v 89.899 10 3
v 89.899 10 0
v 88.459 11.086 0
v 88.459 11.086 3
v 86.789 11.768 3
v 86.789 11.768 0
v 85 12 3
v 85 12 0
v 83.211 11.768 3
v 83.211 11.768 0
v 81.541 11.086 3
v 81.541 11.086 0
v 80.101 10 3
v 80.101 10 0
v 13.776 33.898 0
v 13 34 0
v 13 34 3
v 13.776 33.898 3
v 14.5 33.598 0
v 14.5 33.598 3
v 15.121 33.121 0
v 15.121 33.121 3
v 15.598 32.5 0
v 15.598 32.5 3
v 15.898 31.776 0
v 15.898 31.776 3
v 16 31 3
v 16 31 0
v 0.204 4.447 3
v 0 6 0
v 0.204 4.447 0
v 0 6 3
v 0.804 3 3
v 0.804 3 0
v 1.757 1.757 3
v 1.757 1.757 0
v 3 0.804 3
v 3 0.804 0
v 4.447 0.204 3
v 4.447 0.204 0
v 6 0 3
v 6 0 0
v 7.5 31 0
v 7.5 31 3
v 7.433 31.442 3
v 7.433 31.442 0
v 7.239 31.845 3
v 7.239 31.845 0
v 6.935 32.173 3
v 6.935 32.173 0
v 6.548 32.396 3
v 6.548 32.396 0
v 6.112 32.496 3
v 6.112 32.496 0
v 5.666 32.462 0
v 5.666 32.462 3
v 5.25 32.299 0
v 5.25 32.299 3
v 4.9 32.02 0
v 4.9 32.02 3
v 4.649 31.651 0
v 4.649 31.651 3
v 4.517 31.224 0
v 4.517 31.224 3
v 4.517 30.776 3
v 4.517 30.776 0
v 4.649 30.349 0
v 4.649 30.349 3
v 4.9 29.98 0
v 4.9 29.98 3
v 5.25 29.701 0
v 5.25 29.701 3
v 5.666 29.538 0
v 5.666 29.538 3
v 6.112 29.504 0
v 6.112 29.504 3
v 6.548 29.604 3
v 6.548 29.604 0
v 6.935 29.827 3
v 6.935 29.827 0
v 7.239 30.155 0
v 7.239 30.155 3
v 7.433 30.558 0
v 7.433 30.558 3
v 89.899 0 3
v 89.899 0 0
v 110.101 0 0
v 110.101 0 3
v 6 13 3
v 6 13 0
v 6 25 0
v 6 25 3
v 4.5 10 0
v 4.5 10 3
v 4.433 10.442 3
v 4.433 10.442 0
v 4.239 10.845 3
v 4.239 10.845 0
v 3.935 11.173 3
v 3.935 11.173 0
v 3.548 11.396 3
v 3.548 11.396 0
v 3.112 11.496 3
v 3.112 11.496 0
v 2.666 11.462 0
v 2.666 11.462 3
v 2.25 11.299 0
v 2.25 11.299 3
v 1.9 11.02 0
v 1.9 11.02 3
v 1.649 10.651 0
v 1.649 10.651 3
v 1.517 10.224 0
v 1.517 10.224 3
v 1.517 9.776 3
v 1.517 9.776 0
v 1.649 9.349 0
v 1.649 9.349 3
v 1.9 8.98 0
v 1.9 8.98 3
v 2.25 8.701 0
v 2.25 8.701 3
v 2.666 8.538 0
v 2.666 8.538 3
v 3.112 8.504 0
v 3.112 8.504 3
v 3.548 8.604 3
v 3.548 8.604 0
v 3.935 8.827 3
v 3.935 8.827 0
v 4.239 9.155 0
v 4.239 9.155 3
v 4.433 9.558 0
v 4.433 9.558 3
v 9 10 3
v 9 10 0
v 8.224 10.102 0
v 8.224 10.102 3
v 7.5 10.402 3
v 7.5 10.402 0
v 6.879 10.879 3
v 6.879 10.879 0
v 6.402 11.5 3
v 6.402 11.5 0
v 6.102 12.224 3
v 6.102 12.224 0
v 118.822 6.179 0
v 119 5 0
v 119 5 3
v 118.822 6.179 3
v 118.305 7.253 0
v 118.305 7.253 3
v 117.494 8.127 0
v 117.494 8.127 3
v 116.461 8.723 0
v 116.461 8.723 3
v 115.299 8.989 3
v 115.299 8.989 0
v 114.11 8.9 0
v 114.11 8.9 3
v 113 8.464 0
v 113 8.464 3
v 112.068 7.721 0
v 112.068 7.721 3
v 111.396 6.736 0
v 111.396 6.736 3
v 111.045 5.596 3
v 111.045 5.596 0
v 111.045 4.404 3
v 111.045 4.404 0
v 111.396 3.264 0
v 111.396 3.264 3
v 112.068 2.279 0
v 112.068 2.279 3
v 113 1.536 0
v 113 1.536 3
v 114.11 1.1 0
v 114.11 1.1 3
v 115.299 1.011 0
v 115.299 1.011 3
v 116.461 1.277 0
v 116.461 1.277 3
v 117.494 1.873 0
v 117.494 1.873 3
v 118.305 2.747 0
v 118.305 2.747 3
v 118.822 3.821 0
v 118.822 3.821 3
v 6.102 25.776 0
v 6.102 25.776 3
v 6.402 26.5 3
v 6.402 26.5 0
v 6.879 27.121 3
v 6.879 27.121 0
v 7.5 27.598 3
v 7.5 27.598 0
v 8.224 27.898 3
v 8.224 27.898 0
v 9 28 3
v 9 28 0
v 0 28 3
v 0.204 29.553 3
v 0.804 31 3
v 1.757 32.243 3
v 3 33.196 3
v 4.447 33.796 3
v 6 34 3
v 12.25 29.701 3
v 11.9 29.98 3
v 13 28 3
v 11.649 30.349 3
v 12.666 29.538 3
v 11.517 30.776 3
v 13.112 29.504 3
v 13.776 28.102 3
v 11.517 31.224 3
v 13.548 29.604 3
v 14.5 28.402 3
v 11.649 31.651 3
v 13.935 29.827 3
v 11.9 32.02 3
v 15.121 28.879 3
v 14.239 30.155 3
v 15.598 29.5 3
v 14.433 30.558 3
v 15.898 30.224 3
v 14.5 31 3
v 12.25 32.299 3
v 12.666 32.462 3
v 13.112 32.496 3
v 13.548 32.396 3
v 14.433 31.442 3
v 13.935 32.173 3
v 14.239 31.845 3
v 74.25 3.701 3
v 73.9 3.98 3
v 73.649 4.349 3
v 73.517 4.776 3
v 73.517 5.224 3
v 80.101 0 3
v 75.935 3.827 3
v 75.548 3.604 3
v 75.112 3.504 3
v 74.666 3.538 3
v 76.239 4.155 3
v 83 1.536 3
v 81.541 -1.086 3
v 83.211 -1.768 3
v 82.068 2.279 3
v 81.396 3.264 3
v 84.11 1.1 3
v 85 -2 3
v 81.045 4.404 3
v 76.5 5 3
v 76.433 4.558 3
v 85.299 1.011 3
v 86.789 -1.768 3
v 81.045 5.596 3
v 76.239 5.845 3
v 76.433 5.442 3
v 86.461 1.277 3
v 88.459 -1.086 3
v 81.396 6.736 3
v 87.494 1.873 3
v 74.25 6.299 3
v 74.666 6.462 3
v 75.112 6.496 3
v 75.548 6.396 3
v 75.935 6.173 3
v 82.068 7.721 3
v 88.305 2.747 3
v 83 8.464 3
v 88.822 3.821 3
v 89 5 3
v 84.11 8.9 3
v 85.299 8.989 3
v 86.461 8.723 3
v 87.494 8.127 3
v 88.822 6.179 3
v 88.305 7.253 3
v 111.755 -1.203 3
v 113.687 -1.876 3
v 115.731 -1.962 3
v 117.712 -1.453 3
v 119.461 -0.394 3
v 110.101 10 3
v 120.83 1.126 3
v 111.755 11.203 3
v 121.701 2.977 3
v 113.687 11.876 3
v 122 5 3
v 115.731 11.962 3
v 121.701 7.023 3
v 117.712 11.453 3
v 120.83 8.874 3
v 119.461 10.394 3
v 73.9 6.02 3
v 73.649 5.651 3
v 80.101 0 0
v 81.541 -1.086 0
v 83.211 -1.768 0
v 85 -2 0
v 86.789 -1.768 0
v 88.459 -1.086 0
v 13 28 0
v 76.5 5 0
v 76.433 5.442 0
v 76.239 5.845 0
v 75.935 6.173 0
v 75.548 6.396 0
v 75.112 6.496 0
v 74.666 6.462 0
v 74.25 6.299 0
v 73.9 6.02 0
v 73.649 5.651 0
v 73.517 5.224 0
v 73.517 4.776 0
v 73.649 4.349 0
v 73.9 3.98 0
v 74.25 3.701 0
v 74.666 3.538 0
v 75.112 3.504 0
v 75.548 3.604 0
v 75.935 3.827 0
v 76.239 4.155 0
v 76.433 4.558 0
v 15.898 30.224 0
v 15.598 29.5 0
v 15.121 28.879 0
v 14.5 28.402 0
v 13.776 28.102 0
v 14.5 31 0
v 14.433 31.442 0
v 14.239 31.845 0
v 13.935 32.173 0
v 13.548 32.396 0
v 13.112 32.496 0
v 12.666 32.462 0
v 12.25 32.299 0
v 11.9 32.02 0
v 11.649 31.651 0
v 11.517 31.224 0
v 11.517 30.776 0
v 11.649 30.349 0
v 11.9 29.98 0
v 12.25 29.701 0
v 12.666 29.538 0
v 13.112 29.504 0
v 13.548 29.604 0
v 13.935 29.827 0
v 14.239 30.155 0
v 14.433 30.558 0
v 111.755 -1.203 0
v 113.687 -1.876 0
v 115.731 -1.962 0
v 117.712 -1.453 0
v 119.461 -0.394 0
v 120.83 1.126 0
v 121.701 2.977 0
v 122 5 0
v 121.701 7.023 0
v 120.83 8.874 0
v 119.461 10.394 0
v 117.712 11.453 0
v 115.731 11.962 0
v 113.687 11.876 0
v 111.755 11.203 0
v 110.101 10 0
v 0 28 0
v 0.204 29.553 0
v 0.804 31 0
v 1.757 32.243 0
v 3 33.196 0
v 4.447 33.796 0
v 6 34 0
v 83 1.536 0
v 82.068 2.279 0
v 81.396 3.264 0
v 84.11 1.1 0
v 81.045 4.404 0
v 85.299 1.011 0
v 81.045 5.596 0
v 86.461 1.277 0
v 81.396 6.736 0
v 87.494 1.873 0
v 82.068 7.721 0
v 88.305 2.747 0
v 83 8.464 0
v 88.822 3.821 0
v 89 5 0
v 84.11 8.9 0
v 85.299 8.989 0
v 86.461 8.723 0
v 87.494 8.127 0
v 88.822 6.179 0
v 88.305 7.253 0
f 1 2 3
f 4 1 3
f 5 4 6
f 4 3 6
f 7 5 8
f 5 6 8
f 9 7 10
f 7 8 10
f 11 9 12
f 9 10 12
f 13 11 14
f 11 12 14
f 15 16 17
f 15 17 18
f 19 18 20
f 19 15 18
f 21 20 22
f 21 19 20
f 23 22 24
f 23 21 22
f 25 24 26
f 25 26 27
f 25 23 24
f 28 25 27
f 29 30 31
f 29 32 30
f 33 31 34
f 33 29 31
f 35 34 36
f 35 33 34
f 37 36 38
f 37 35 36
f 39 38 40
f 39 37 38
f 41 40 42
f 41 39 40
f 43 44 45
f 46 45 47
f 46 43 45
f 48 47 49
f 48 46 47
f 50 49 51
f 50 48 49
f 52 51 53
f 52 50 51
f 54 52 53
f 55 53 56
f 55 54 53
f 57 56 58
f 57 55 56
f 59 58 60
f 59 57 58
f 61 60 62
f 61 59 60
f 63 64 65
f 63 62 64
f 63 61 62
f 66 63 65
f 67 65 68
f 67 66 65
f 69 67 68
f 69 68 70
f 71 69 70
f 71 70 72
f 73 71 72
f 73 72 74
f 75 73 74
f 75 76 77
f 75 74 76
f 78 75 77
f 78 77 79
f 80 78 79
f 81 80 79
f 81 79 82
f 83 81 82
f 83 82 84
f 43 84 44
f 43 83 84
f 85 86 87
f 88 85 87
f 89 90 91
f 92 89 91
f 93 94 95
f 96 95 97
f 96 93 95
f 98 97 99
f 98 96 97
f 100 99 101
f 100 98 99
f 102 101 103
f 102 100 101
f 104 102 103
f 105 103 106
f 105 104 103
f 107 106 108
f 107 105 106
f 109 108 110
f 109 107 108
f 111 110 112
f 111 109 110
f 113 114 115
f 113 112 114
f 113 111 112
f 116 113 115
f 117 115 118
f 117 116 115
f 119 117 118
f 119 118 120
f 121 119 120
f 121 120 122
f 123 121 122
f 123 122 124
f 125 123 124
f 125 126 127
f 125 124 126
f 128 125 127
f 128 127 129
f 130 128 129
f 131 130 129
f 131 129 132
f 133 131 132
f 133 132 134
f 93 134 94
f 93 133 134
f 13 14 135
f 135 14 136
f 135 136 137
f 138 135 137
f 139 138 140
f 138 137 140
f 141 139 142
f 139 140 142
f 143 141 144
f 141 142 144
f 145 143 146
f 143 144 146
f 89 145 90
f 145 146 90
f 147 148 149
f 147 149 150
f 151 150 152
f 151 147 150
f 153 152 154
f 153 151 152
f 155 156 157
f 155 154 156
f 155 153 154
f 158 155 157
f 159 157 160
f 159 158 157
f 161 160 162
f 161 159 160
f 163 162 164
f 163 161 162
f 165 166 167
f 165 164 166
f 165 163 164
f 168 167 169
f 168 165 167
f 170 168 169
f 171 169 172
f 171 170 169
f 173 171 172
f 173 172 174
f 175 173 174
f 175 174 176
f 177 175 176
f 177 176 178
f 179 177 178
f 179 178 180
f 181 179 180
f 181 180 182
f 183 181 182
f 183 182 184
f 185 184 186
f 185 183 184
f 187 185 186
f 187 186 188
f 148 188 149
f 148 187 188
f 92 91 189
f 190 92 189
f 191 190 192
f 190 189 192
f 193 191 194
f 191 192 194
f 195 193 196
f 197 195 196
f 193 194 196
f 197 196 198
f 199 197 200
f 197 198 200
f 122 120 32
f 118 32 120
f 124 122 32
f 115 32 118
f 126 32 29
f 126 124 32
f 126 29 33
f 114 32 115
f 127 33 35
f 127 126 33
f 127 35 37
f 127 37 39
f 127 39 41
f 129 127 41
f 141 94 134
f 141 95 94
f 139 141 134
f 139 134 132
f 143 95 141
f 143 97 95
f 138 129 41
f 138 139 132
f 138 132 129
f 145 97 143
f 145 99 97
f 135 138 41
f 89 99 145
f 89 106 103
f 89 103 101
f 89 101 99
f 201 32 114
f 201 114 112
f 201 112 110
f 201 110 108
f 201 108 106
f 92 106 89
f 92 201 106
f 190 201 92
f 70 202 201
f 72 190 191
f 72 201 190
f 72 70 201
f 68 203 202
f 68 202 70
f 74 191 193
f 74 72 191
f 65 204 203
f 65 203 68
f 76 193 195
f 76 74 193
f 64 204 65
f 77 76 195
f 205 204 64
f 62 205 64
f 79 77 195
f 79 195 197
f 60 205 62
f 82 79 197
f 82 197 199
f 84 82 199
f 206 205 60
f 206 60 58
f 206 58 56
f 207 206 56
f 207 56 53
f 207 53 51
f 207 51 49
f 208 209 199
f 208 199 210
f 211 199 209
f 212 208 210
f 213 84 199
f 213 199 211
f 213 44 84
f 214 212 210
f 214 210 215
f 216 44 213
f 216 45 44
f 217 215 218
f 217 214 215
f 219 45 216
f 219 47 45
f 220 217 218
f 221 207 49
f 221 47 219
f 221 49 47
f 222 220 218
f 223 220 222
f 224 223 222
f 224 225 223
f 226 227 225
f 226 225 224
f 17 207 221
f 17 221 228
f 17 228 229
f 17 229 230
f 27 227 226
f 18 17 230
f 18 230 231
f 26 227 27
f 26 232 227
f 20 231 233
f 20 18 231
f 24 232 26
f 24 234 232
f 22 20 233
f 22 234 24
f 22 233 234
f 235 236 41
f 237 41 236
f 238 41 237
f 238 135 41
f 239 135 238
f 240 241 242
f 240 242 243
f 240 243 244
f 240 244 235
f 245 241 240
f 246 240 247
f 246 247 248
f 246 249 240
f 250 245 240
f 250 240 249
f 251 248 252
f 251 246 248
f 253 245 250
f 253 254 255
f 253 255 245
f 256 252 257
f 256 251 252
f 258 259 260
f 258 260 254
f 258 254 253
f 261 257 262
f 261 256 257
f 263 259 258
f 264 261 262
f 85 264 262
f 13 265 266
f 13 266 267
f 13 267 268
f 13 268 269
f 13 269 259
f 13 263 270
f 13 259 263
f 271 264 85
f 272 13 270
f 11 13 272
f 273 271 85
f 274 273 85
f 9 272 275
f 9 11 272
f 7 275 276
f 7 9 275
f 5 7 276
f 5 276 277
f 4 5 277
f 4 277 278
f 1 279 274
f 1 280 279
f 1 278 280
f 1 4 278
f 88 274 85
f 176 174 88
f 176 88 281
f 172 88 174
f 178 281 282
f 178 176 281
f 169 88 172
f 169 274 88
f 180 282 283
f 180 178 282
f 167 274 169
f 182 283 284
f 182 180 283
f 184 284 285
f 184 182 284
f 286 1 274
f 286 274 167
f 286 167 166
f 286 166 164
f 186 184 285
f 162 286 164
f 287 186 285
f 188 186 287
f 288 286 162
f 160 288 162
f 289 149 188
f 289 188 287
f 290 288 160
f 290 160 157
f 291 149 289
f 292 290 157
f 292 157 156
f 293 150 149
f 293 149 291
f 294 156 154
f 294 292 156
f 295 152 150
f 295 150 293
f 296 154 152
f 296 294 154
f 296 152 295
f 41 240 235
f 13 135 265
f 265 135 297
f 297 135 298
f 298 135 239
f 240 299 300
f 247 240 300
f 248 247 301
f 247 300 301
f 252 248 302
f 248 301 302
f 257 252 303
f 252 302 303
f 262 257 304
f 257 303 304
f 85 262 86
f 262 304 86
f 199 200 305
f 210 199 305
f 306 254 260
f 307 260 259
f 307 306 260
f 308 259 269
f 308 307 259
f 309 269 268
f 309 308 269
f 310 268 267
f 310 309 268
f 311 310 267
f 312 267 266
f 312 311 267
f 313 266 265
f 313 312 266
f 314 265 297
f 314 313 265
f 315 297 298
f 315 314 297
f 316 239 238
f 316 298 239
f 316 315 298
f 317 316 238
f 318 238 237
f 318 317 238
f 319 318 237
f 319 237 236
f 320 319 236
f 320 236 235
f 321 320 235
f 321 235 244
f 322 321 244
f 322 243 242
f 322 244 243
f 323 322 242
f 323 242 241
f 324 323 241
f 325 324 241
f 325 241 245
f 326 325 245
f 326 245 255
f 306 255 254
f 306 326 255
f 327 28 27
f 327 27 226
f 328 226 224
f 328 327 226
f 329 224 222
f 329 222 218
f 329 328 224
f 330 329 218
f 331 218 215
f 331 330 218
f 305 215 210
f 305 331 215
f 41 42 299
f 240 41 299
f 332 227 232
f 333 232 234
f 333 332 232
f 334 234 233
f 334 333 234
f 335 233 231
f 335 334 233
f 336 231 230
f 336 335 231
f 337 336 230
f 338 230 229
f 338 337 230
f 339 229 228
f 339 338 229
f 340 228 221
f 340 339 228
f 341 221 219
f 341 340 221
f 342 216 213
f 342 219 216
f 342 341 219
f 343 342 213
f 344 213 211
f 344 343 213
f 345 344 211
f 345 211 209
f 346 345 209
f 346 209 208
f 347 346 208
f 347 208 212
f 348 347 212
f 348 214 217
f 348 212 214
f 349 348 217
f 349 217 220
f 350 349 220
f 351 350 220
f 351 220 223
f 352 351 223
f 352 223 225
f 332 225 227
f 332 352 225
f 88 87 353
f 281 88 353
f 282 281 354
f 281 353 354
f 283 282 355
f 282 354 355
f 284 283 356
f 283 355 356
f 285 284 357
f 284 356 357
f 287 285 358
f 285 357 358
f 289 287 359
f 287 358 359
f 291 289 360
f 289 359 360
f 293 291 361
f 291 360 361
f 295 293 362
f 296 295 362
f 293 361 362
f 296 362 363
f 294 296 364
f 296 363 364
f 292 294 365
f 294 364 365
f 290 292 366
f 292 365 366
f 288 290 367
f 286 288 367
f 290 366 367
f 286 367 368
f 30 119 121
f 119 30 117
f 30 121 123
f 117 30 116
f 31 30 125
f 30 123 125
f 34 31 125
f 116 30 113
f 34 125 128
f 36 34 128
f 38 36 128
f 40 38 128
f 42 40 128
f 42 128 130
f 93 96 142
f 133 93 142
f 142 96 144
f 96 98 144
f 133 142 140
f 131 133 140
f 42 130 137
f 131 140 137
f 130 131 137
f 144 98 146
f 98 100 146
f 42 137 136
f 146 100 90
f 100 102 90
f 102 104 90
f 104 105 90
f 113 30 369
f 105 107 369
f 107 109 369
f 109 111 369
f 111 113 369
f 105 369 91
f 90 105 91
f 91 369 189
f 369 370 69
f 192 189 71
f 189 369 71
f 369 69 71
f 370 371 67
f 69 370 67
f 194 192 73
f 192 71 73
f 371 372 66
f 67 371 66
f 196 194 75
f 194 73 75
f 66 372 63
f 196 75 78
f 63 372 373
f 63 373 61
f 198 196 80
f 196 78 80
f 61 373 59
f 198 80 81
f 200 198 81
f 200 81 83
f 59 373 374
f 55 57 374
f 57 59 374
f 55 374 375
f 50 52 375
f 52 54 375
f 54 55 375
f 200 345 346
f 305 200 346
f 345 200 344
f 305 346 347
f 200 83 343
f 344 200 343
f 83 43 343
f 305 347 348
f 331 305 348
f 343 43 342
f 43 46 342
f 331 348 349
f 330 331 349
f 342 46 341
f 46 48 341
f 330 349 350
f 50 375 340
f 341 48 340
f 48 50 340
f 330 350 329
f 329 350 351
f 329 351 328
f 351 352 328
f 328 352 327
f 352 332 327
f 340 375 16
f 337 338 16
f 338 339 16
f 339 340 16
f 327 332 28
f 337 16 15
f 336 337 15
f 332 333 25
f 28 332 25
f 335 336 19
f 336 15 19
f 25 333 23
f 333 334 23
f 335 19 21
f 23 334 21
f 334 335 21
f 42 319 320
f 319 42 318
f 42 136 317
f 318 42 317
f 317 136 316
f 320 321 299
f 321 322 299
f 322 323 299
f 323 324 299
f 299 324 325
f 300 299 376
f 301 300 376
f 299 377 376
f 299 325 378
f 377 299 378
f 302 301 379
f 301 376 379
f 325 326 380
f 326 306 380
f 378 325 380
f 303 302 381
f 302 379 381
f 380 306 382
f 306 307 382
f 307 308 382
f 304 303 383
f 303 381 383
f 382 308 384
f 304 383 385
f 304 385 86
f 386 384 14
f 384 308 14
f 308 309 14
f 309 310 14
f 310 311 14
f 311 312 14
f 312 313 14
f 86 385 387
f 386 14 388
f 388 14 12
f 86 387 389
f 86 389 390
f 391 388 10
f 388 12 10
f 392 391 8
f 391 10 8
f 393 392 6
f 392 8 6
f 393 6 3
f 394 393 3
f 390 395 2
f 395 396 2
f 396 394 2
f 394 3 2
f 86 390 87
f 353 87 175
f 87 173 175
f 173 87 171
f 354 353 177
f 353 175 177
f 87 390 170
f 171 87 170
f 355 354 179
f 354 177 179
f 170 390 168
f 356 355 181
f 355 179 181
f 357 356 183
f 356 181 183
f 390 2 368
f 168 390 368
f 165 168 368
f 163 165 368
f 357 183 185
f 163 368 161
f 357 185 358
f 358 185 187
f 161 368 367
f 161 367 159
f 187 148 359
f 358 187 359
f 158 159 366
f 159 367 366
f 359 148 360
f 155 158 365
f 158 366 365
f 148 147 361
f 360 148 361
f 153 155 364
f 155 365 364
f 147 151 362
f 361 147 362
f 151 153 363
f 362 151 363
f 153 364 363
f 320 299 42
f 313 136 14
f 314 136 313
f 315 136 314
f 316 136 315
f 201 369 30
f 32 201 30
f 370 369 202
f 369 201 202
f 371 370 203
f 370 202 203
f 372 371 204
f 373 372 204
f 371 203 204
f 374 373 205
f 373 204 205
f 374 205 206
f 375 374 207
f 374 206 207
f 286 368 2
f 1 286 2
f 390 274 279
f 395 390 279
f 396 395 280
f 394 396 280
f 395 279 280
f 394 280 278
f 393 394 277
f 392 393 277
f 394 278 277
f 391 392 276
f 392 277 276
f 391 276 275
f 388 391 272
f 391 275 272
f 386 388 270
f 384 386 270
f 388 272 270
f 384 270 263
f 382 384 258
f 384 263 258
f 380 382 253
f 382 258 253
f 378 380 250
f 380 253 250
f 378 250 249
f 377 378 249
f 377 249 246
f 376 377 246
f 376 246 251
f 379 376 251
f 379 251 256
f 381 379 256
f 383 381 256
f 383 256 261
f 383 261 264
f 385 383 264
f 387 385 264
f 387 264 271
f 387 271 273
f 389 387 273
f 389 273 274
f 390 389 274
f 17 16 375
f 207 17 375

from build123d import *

# Parameters (mm, degrees)
EXTRUDE_1_DEPTH     = 3
CUT_EXTRUDE_START   = -4
SKETCH_3_R          = 4
CUT_EXTRUDE_1_DEPTH = 131.684647847
FILLET_START        = -1
FILLET_1_DEPTH      = 5
FILLET_1_2_DEPTH    = 3
FILLET_2_R          = 6
SKETCH_4_R          = 4
CUT_EXTRUDE_2_DEPTH = 4
SKETCH_5_R          = 1.5
CUT_EXTRUDE_4_DEPTH = 10


with BuildPart() as part:
    # 草图1 → 凸台-拉伸1 (new body)
    with BuildSketch(Plane.XY):
        with BuildLine():
            Line((0, 0), (80.101020514, 0))
            ThreePointArc((80.101020514, 0), (85, -2), (89.898979486, 0))
            Line((89.898979486, 0), (110.101020514, 0))
            ThreePointArc((110.101020514, 0), (122, 5), (110.101020514, 10))
            Line((110.101020514, 10), (89.898979486, 10))
            ThreePointArc((89.898979486, 10), (85, 12), (80.101020514, 10))
            Line((80.101020514, 10), (6, 10))
            Line((6, 10), (6, 28))
            Line((6, 28), (16, 28))
            Line((16, 28), (16, 34))
            Line((16, 34), (0, 34))
            Line((0, 34), (0, 0))
        make_face()
    extrude(amount=EXTRUDE_1_DEPTH)

    # 草图3 → 切除-拉伸1 (cut, through all)
    with BuildSketch(Plane.XY.offset(3).offset(CUT_EXTRUDE_START)):
        with Locations((115, 5)):
            Circle(SKETCH_3_R)
    extrude(amount=CUT_EXTRUDE_1_DEPTH, mode=Mode.SUBTRACT)

    # 圆角1: read off the stored shape, not the designer's step
    # 圆角1 outline → 圆角1 (cut)
    with BuildSketch(Plane.XY.offset(FILLET_START)):
        with BuildLine():
            ThreePointArc((13, 34), (15.121320344, 33.121320344), (16, 31))
            Line((16, 31), (16, 34))
            Line((16, 34), (13, 34))
        make_face()
        with BuildLine():
            ThreePointArc((16, 31), (15.121320344, 28.878679656), (13, 28))
            Line((13, 28), (16, 28))
            Line((16, 28), (16, 31))
        make_face()
    extrude(amount=FILLET_1_DEPTH, mode=Mode.SUBTRACT)

    # Fillet 1 2 outline → Fillet 1 2 (add)
    with BuildSketch(Plane.XY):
        with BuildLine():
            Line((6, 28), (6, 25))
            ThreePointArc((6, 25), (6.878679656, 27.121320344), (9, 28))
            Line((9, 28), (6, 28))
        make_face()
        with BuildLine():
            ThreePointArc((9, 10), (6.878679656, 10.878679656), (6, 13))
            Line((6, 13), (6, 10))
            Line((6, 10), (9, 10))
        make_face()
    extrude(amount=FILLET_1_2_DEPTH)

    # 圆角2
    fillet_2_edges = [part.edges().sort_by_distance(p)[0] for p in [
        (0, 34, 1.5),
        (0, 0, 1.5),
    ]]
    fillet(fillet_2_edges, radius=FILLET_2_R)

    # 草图4 → 切除-拉伸2 (cut)
    with BuildSketch(Plane.XY.offset(3)):
        with Locations((85, 5)):
            Circle(SKETCH_4_R)
    extrude(amount=-CUT_EXTRUDE_2_DEPTH, mode=Mode.SUBTRACT)

    # 草图5 → 切除-拉伸4 (cut)
    with BuildSketch(Plane.XY):
        with Locations((75, 5)):
            Circle(SKETCH_5_R)
        with Locations((3, 10)):
            Circle(SKETCH_5_R)
        with Locations((13, 31)):
            Circle(SKETCH_5_R)
        with Locations((6, 31)):
            Circle(SKETCH_5_R)
    extrude(amount=CUT_EXTRUDE_4_DEPTH, mode=Mode.SUBTRACT)


solid = part.part
